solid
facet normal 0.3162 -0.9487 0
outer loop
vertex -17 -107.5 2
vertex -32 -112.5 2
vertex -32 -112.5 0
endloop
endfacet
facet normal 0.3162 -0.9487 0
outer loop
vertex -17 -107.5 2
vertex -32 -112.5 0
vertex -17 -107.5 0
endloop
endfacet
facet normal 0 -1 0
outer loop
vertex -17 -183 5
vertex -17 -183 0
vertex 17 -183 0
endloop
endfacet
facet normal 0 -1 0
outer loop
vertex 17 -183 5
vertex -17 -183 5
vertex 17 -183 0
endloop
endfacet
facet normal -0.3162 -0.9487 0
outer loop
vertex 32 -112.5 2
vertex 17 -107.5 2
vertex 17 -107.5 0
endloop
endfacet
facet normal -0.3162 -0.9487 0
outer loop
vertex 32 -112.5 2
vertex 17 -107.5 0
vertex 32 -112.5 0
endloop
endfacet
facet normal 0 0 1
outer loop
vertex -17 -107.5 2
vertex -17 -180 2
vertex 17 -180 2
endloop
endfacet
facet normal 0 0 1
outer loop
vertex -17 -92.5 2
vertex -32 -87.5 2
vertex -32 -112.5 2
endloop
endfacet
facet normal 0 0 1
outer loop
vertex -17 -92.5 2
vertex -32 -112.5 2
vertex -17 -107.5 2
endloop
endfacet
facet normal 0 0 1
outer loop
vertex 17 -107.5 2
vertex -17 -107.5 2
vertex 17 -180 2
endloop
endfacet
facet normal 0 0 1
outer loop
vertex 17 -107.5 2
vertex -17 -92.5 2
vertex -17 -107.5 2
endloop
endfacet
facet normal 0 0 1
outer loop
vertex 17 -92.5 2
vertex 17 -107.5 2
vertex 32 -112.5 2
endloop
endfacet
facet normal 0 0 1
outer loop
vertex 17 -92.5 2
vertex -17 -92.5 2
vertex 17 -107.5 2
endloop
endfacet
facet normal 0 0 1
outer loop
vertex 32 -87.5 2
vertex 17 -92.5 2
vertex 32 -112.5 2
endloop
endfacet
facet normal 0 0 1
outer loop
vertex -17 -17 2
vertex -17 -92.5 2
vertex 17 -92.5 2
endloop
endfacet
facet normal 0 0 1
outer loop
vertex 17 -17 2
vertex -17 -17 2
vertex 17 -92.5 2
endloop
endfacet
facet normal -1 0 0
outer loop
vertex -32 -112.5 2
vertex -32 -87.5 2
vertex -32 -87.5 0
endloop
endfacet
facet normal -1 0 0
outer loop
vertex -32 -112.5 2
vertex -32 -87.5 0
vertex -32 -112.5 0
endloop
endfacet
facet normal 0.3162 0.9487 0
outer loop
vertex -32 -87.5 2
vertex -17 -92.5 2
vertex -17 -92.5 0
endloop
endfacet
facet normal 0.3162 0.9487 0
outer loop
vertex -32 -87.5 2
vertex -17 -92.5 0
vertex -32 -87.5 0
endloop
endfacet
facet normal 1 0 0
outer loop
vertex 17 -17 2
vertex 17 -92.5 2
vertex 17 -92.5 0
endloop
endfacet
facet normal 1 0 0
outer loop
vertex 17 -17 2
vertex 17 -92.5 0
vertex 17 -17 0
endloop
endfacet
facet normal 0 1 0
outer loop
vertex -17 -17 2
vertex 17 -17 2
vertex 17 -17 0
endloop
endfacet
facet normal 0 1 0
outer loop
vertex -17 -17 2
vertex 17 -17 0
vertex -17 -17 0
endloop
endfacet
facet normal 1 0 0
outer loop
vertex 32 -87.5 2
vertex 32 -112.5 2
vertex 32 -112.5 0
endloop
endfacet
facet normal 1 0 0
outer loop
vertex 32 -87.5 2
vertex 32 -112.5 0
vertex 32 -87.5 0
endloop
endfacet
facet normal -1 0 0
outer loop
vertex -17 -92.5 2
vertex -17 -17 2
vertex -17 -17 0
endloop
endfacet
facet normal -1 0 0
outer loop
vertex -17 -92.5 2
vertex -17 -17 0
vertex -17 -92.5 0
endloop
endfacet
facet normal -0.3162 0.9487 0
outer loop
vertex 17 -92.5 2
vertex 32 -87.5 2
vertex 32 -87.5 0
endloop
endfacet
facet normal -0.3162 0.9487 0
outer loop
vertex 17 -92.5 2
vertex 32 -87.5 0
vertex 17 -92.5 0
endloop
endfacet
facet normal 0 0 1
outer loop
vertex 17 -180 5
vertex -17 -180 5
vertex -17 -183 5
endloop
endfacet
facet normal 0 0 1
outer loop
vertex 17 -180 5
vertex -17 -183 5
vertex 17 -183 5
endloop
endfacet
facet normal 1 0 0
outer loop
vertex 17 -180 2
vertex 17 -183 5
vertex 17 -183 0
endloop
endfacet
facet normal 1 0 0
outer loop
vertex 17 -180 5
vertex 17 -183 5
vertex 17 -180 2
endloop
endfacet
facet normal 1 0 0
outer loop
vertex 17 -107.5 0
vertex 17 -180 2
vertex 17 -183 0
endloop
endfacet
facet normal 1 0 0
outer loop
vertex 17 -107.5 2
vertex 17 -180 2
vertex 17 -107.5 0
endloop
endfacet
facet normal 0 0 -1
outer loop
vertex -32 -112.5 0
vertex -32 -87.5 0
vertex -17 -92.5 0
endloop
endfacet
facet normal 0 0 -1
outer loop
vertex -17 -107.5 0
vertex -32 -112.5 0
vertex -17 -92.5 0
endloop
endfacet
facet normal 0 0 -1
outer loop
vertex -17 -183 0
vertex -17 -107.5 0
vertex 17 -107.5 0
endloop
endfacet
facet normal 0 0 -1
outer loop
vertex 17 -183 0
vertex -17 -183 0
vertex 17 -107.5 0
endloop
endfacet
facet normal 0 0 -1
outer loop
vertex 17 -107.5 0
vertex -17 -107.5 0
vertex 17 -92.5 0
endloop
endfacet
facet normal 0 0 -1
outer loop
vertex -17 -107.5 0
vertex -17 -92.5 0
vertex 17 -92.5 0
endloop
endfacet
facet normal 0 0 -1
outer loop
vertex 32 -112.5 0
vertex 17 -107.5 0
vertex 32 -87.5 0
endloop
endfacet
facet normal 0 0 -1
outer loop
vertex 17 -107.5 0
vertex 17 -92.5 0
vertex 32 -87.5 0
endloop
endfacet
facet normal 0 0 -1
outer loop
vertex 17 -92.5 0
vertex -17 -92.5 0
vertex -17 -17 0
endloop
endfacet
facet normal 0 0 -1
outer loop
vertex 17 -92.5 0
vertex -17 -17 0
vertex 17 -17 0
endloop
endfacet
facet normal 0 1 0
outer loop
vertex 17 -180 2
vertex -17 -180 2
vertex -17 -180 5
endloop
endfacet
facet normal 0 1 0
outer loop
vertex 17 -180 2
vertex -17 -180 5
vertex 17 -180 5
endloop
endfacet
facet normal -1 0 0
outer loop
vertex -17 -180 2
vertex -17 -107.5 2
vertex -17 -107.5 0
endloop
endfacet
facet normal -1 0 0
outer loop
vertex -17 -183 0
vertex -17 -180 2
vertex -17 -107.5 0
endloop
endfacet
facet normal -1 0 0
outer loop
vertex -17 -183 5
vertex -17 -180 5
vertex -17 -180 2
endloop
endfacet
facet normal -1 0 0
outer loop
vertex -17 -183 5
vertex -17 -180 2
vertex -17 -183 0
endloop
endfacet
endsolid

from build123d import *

# Parameters (mm, degrees)
F0_W     = 360
F0_H     = 360
F1_DEPTH = 2
F0_W_2   = 366
F0_H_2   = 366
F2_DEPTH = 5
F3_W     = 34
F3_H     = 3
F4_DEPTH = 25


with BuildPart() as f1:
    # F0 (on Top) → F1 (new body)
    with BuildSketch(Plane.XY):
        Rectangle(F0_W, F0_H)
    extrude(amount=F1_DEPTH)

    # F0 (on Top) → F2 (join)
    with BuildSketch(Plane.XY):
        Rectangle(F0_W_2, F0_H_2)
        Rectangle(F0_W, F0_H, mode=Mode.SUBTRACT)
    extrude(amount=F2_DEPTH)

    # F3 (on face) → F4 (intersect)
    with BuildSketch(Plane.XY.offset(5)):
        Polygon((17, -92.5), (17, -17), (-17, -17), (-17, -92.5), (-32, -87.5), (-32, -112.5), (-17, -107.5), (-17, -180), (17, -180), (17, -107.5), (32, -112.5), (32, -87.5), align=None)
        with Locations((0, -181.5)):
            Rectangle(F3_W, F3_H)
    extrude(amount=-F4_DEPTH, mode=Mode.INTERSECT)


solid = f1.part
